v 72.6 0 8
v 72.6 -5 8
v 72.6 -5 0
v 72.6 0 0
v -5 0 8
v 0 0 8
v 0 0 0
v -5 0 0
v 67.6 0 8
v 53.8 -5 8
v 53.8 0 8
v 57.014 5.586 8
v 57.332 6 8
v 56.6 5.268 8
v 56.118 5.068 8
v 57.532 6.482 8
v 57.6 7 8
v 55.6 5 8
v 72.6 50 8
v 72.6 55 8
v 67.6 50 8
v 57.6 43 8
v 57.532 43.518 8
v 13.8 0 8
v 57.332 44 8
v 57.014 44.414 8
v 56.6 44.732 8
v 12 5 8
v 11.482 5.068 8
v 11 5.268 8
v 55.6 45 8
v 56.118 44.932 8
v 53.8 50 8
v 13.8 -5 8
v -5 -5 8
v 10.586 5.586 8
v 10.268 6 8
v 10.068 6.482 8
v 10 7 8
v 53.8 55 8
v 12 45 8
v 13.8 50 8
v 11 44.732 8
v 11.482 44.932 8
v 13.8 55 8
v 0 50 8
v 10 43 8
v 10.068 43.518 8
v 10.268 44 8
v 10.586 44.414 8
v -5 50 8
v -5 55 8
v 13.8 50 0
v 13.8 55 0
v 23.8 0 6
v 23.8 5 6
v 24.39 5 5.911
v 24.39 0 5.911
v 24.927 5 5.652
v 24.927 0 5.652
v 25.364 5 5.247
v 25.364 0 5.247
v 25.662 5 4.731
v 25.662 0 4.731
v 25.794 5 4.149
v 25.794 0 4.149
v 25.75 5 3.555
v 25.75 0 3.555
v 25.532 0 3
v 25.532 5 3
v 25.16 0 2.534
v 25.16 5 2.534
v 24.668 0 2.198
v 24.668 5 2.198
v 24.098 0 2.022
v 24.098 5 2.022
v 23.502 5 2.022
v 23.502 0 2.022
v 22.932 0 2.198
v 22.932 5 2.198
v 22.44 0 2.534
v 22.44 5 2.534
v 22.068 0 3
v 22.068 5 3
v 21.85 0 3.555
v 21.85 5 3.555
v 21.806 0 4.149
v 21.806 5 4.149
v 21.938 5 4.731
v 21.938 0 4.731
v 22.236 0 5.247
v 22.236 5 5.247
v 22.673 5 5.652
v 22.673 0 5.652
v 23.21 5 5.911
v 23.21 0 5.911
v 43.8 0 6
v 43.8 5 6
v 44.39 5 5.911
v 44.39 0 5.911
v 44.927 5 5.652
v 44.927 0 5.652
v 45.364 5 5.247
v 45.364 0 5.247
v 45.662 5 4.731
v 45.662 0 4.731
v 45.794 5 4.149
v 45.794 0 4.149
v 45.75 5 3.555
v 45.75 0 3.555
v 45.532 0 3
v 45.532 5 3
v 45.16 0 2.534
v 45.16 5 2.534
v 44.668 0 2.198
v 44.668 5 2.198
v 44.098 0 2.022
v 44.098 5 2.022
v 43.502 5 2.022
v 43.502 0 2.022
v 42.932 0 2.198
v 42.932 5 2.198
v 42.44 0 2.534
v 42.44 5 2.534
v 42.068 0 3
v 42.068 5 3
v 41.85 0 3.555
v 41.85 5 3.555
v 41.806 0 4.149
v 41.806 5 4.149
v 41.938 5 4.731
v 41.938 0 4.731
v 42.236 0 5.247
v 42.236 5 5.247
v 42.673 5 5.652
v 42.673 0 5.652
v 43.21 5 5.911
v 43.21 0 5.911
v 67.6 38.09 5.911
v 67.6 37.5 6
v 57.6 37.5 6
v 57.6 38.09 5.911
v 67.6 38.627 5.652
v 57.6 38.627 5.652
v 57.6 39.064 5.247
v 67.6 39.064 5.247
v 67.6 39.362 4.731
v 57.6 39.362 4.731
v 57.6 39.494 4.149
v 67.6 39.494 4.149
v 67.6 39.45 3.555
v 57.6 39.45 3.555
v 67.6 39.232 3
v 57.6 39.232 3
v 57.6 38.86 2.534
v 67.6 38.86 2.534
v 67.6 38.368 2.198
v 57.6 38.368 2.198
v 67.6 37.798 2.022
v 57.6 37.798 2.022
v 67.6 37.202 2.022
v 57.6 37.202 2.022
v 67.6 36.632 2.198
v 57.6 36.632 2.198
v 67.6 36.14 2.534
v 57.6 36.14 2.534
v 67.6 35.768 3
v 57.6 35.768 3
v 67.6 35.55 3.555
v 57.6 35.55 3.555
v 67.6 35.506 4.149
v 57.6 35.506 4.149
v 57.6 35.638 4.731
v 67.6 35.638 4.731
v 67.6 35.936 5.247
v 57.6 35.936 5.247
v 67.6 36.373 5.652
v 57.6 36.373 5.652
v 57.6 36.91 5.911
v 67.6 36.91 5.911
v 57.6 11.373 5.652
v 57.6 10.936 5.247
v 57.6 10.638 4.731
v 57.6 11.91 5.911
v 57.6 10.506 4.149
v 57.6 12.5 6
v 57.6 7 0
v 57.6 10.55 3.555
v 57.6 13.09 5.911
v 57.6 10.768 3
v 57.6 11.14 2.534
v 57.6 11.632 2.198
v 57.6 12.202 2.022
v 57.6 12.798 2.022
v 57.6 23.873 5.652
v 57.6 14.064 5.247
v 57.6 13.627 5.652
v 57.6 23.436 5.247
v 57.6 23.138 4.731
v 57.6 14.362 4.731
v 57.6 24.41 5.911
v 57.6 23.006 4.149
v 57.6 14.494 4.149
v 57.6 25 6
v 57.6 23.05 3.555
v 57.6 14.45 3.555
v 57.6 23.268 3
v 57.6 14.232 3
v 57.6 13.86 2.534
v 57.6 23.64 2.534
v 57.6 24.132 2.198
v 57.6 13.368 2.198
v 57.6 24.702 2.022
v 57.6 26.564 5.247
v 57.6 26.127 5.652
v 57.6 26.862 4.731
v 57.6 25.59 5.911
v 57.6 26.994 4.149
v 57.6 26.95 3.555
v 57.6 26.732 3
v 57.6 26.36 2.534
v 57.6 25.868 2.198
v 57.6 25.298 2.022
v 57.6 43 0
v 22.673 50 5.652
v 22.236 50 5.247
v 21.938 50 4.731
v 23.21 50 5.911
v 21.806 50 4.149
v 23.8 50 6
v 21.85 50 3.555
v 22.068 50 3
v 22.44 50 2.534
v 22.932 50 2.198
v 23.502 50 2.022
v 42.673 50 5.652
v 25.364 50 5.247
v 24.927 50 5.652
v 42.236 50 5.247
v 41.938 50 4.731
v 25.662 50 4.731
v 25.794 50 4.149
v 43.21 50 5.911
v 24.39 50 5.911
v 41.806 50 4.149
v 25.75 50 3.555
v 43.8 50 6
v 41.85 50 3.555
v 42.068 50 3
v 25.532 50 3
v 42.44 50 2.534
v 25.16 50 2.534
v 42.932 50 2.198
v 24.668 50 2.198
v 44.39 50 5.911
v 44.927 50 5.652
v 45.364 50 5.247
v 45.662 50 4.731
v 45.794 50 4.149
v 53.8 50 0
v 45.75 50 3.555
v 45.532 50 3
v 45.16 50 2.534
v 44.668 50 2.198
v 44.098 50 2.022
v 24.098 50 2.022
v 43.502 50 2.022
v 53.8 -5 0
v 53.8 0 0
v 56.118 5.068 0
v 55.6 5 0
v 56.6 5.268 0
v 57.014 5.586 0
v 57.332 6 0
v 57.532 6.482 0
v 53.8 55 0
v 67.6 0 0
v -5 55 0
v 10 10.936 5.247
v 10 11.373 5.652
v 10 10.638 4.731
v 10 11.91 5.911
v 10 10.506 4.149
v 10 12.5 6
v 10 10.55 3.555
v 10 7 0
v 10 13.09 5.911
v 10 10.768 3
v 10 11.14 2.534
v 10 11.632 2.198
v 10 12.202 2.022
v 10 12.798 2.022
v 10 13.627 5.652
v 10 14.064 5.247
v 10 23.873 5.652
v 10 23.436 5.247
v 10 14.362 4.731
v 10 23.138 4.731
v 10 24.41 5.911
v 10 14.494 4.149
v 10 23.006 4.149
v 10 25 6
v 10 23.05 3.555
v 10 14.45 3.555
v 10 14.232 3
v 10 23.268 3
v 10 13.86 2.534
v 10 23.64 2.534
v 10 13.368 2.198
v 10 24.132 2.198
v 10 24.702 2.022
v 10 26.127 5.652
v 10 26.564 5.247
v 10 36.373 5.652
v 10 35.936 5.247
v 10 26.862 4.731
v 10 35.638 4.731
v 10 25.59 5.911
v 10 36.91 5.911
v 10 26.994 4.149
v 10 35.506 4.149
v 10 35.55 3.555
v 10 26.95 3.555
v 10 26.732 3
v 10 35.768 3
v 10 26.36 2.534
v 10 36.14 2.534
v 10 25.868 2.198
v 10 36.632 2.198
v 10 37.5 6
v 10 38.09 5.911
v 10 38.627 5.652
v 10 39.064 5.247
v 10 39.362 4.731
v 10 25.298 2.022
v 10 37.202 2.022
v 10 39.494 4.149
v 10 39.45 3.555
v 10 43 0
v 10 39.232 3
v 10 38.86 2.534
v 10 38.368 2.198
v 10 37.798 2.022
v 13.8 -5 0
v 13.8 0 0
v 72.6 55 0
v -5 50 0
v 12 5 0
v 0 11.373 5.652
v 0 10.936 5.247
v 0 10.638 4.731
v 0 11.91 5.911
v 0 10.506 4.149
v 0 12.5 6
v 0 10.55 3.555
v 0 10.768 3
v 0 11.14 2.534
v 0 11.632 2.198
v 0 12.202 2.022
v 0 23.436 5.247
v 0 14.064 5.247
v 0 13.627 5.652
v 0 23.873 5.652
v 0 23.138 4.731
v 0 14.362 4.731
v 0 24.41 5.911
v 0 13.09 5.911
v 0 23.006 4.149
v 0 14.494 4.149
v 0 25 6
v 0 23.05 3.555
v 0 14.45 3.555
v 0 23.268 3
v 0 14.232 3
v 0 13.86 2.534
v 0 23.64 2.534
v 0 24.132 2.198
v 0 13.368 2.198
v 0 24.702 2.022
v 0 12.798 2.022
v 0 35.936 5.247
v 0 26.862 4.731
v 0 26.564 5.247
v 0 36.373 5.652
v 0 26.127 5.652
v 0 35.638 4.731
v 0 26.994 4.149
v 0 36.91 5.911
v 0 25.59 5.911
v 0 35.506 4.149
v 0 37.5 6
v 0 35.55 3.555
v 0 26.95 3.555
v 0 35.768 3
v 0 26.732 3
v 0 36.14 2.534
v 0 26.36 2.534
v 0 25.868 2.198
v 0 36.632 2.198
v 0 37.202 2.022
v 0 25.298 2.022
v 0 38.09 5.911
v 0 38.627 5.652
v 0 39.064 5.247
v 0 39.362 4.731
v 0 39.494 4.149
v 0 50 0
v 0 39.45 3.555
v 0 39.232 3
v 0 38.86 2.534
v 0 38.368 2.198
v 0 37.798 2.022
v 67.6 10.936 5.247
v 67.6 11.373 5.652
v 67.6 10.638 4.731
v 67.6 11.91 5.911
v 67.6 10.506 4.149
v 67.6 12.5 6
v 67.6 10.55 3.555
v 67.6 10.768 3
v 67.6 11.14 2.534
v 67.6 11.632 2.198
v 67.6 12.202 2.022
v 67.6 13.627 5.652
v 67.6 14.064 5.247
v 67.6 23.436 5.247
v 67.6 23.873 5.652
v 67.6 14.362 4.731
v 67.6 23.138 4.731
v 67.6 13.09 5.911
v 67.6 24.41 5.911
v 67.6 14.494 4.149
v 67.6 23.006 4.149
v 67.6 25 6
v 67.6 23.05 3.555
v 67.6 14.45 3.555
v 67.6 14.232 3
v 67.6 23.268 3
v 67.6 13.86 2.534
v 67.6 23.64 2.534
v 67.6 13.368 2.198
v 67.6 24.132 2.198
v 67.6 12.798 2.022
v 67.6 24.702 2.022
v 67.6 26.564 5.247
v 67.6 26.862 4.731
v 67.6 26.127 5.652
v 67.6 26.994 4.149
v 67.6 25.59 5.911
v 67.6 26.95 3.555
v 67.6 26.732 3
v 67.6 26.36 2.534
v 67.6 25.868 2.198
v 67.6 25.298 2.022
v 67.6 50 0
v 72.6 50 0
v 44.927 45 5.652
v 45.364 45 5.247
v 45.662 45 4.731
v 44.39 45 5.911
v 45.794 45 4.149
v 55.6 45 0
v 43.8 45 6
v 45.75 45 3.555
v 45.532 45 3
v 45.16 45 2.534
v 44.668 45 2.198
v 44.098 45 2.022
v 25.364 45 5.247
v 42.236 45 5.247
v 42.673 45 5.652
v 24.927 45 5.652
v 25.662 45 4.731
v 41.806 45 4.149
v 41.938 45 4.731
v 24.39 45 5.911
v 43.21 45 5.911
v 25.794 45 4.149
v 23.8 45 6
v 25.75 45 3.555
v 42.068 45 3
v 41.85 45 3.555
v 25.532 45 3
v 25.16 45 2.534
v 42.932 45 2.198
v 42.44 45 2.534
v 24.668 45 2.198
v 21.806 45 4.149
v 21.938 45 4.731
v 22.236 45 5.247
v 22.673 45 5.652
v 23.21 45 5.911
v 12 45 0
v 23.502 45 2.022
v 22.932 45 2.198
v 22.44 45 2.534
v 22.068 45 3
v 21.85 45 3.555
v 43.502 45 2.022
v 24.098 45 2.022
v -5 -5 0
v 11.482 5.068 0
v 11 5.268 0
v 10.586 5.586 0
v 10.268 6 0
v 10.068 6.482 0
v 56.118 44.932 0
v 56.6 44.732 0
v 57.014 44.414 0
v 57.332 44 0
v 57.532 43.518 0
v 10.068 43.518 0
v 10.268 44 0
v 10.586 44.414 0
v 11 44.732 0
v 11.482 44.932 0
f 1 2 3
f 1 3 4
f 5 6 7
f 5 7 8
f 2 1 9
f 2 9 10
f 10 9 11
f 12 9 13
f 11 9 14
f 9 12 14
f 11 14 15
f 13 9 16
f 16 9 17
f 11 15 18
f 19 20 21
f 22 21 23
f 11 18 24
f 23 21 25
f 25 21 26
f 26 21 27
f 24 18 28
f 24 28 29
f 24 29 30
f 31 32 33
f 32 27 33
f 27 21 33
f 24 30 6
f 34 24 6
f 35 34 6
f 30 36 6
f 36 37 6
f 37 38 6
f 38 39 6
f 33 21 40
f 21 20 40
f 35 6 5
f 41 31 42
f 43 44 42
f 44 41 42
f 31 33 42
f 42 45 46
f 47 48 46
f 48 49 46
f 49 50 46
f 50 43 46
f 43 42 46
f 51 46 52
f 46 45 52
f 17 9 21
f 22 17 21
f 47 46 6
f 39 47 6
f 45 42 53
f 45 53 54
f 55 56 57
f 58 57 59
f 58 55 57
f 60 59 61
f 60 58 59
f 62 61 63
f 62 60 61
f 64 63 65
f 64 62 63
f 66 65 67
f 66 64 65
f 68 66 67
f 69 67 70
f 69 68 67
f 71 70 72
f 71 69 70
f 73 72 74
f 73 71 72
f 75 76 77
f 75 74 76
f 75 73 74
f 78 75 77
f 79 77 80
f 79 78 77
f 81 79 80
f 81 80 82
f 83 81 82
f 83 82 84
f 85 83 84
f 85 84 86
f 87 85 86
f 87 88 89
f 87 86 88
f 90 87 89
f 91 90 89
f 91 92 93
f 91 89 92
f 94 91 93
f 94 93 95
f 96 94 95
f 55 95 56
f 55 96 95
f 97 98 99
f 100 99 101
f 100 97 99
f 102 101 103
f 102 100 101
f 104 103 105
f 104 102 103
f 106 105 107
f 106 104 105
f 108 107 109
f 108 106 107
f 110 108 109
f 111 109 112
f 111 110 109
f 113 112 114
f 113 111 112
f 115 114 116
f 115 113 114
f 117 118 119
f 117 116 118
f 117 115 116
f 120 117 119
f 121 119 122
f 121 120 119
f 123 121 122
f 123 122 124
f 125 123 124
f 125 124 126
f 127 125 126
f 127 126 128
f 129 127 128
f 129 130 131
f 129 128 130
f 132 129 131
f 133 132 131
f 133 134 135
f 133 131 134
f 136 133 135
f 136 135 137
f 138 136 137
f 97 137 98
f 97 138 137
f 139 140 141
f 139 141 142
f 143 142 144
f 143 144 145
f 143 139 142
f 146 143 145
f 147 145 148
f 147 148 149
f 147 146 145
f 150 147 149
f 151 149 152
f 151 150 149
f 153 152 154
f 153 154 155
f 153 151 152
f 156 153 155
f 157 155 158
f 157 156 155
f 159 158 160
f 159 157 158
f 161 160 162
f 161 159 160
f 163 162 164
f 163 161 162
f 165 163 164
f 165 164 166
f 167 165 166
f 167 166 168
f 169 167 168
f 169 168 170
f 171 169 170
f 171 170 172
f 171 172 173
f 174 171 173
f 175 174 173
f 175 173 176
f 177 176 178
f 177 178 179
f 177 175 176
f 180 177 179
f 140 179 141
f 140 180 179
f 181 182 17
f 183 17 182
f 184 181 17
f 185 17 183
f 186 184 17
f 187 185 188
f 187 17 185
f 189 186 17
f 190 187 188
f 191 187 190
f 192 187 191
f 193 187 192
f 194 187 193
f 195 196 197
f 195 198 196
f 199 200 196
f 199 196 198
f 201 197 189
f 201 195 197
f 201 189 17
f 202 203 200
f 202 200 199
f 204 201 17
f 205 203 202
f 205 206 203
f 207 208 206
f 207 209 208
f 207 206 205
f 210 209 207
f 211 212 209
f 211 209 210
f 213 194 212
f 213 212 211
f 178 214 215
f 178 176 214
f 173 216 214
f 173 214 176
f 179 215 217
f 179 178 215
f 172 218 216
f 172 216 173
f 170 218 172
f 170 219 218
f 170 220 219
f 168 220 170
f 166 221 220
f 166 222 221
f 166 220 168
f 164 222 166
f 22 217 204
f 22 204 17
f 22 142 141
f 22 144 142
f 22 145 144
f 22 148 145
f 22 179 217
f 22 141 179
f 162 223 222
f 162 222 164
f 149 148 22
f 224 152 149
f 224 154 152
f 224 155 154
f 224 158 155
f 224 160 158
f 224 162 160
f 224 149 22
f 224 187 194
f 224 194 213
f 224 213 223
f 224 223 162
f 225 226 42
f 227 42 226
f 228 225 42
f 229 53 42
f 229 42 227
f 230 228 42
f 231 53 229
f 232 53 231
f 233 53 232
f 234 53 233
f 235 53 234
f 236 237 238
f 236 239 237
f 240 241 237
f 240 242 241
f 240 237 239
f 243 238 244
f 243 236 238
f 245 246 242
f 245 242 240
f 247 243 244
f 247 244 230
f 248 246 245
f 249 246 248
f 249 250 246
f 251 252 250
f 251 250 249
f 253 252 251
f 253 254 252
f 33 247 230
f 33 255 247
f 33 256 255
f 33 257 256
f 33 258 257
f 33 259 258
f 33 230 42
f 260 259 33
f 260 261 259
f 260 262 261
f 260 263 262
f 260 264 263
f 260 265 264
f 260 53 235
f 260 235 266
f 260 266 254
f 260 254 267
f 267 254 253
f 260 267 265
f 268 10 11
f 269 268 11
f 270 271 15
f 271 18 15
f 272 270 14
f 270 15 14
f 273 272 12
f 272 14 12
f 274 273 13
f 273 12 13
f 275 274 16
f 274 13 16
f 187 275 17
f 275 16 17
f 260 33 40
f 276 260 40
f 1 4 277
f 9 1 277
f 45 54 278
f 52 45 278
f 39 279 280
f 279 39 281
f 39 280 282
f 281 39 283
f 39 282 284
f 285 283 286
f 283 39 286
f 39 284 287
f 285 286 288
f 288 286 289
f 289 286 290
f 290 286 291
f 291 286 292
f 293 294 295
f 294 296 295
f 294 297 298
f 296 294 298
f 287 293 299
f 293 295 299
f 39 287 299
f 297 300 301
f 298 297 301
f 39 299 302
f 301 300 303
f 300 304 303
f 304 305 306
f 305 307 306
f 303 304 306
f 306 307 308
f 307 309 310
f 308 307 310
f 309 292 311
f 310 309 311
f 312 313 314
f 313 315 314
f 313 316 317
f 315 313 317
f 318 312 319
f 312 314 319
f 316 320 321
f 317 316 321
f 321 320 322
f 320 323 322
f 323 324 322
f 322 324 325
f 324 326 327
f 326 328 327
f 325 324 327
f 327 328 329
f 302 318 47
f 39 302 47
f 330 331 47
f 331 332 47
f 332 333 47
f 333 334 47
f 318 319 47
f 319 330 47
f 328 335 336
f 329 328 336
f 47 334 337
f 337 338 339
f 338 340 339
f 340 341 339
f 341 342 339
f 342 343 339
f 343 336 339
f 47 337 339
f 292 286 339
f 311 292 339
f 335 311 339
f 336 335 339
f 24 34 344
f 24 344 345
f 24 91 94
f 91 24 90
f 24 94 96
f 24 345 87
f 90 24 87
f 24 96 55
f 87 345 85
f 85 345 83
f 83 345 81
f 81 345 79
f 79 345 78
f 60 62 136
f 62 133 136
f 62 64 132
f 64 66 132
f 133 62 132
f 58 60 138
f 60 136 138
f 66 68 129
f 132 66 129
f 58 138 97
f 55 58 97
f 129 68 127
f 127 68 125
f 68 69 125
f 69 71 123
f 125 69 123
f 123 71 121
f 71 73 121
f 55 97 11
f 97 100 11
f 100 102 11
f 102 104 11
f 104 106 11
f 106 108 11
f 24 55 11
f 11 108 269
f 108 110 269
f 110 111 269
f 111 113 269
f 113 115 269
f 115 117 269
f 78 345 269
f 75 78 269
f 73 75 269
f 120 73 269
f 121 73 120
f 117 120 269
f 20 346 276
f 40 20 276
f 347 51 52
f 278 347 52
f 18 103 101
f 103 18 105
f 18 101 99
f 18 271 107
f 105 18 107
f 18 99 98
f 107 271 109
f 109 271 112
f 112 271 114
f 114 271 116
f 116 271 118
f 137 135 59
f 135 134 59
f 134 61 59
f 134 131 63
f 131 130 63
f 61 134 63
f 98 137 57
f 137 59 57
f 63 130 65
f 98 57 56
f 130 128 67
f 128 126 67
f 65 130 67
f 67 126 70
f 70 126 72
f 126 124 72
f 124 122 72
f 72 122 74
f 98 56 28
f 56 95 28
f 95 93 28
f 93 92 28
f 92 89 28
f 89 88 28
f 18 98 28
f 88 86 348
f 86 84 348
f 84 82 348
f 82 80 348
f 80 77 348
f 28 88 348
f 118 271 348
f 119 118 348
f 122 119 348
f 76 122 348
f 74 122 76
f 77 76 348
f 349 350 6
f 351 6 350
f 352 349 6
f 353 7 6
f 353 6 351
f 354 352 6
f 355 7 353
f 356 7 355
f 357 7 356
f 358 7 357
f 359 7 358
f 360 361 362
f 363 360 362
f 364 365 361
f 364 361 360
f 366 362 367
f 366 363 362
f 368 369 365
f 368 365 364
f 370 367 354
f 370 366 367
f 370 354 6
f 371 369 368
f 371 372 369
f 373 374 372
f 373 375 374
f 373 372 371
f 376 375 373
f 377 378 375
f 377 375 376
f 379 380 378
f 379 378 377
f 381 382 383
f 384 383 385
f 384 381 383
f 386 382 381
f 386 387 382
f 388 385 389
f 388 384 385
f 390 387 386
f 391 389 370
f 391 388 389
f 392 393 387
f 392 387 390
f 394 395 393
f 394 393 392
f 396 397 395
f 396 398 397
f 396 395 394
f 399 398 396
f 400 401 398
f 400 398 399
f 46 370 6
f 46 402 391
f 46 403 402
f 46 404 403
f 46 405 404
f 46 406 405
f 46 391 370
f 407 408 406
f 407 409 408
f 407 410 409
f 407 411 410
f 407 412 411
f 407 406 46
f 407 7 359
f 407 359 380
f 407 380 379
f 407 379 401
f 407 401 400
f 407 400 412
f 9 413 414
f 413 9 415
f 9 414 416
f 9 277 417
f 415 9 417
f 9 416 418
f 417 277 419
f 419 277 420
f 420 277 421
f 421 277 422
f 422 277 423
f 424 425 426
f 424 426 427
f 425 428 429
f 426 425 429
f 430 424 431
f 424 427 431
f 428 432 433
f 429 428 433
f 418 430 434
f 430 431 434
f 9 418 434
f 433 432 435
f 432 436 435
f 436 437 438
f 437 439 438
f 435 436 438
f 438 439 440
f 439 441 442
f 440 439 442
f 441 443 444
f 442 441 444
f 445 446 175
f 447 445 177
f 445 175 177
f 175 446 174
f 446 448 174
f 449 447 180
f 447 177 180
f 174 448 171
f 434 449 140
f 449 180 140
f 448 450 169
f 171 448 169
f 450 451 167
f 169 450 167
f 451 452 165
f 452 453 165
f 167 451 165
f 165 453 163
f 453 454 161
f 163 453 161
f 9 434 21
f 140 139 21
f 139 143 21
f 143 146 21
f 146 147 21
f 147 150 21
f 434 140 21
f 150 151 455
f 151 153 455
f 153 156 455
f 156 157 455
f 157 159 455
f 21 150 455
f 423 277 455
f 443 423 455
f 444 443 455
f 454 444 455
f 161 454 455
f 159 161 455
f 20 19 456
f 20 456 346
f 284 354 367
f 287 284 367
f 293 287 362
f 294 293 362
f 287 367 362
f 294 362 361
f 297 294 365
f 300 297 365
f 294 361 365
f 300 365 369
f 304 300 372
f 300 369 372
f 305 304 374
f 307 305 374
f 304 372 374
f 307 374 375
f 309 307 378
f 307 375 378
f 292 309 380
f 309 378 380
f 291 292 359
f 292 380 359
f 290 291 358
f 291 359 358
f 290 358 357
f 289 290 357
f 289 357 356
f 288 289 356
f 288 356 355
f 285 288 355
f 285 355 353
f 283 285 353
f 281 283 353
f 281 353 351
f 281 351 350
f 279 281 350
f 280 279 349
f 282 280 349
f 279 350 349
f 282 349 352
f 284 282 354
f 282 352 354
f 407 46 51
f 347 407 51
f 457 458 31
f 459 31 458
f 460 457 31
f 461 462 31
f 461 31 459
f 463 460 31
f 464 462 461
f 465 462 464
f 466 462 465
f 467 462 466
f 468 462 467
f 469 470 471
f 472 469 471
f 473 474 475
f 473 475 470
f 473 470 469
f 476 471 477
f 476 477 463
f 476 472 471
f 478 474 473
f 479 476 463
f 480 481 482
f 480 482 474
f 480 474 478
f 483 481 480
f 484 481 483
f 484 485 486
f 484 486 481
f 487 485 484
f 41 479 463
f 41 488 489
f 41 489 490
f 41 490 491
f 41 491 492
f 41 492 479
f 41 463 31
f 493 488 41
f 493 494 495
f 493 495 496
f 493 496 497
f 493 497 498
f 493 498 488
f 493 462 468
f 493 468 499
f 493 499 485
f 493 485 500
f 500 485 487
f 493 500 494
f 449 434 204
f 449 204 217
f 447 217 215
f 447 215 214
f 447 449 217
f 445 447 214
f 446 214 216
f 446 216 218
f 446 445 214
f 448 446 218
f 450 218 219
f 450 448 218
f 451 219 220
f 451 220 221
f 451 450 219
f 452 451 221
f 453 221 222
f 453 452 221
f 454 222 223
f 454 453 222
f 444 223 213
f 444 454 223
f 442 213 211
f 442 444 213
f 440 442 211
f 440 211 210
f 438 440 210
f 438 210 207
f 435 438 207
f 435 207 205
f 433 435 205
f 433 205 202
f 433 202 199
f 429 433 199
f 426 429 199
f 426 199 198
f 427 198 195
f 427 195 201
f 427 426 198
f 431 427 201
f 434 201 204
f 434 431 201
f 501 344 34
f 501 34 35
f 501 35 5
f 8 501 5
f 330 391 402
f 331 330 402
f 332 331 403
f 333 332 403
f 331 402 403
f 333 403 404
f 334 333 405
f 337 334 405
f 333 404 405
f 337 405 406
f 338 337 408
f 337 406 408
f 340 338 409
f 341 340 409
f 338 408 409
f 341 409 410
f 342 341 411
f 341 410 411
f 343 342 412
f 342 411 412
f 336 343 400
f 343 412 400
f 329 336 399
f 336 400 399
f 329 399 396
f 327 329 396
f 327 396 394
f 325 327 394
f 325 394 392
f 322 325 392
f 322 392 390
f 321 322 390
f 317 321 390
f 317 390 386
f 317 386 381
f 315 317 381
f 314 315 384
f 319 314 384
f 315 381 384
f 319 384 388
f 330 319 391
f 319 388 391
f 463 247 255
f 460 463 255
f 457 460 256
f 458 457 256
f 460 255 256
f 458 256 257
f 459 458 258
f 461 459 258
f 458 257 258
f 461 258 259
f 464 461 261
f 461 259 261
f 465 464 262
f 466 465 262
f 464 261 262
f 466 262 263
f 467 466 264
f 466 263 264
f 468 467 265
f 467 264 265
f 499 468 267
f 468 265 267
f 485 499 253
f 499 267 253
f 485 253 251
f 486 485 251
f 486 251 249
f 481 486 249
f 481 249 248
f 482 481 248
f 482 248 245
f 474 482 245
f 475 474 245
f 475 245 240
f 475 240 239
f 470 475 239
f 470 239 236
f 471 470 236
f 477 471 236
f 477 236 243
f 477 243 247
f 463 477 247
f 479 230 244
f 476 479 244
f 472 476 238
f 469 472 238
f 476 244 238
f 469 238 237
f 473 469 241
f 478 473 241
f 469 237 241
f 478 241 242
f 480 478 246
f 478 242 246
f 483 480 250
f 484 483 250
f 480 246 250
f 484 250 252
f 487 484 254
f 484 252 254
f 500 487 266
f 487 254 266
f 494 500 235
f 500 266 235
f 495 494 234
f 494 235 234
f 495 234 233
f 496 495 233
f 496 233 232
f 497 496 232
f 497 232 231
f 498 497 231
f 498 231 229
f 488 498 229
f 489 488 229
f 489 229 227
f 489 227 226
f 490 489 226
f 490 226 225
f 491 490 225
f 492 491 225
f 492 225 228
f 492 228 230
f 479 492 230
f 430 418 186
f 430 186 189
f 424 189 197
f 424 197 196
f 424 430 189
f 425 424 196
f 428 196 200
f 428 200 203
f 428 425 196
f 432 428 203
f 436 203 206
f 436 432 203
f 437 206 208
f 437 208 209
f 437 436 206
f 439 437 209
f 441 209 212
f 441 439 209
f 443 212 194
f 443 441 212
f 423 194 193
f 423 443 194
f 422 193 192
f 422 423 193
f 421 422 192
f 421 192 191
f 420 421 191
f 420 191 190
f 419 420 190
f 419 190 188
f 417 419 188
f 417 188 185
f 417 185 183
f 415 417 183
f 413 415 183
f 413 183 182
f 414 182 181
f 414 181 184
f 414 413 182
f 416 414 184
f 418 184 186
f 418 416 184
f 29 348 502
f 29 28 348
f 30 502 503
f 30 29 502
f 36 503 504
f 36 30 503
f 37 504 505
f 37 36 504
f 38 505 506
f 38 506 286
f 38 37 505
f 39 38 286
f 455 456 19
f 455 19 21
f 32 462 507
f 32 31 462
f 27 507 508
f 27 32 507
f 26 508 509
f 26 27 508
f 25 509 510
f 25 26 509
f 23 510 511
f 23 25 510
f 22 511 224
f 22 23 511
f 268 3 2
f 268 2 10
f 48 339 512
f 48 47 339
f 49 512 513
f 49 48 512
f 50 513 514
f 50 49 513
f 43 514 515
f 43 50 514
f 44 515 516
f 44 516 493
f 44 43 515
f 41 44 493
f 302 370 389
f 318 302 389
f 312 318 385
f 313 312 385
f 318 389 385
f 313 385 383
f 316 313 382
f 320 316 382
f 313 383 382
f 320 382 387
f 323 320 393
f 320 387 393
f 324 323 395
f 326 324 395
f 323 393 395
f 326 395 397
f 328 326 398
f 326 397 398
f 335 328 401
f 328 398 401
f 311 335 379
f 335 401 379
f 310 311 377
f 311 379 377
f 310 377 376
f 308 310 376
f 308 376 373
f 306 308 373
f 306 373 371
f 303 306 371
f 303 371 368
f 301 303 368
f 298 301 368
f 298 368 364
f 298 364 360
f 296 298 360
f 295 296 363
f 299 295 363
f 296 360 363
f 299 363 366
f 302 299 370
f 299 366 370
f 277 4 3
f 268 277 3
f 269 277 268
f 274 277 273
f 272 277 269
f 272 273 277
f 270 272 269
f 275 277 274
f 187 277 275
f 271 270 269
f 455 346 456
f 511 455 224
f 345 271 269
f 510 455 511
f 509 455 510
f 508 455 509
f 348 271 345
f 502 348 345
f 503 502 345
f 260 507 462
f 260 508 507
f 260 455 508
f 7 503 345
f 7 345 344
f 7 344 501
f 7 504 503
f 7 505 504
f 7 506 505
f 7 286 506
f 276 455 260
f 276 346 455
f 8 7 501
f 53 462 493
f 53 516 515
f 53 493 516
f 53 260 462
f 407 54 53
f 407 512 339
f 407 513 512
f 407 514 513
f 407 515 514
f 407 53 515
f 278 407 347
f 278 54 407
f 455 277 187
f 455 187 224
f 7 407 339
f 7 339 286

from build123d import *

# Parameters (mm, degrees)
SKETCH_1_W          = 67.6
SKETCH_1_H          = 50
EXTRUDE_1_DEPTH     = 8
SKETCH_2_R          = 2
CUT_EXTRUDE_1_DEPTH = 10
SKETCH_3_R          = 2
CUT_EXTRUDE_2_DEPTH = 10
SKETCH_4_W          = 18.8
SKETCH_4_H          = 5
EXTRUDE_2_DEPTH     = 8
SKETCH_5_W          = 47.6
SKETCH_5_H          = 40
CUT_EXTRUDE_3_DEPTH = 8
FILLET_1_R          = 2


with BuildPart() as part:
    # 草图1 → 凸台-拉伸1 (new body)
    with BuildSketch(Plane.XY):
        with Locations((33.8, 25)):
            Rectangle(SKETCH_1_W, SKETCH_1_H)
    extrude(amount=EXTRUDE_1_DEPTH)

    # 草图2 → 切除-拉伸1 (cut)
    with BuildSketch(Plane.ZY):
        with Locations((4, 37.5)):
            Circle(SKETCH_2_R)
        with Locations((4, 25)):
            Circle(SKETCH_2_R)
        with Locations((4, 12.5)):
            Circle(SKETCH_2_R)
    cut_extrude_1 = extrude(amount=-CUT_EXTRUDE_1_DEPTH, mode=Mode.SUBTRACT)

    # 镜向1: 切除-拉伸1 across plane
    add(cut_extrude_1.mirror(Plane(origin=(33.8, 0, 0), x_dir=(0, 0, 1), z_dir=(1, 0, 0))), mode=Mode.SUBTRACT)

    # 草图3 → 切除-拉伸2 (cut)
    with BuildSketch(Plane(origin=(0, 50, 0), x_dir=(1, 0, 0), z_dir=(0, 1, 0))):
        with Locations(Location((23.8, -4, 0), (0, 0, 270))):
            Circle(SKETCH_3_R)
        with Locations(Location((43.8, -4, 0), (0, 0, 270))):
            Circle(SKETCH_3_R)
    cut_extrude_2 = extrude(amount=-CUT_EXTRUDE_2_DEPTH, mode=Mode.SUBTRACT)

    # 镜向2: 切除-拉伸2 across plane
    add(cut_extrude_2.mirror(Plane.ZX.offset(25)), mode=Mode.SUBTRACT)

    # 草图4 → 凸台-拉伸2 (add)
    with BuildSketch(Plane(origin=(0, 0, 0), x_dir=(-1, 0, 0), z_dir=(0, 0, -1))):
        with Locations((-63.2, 52.5)):
            Rectangle(SKETCH_4_W, SKETCH_4_H)
        with Locations((-63.2, -2.5)):
            Rectangle(SKETCH_4_W, SKETCH_4_H)
        with Locations((-4.4, -2.5)):
            Rectangle(SKETCH_4_W, SKETCH_4_H)
        with Locations((-4.4, 52.5)):
            Rectangle(SKETCH_4_W, SKETCH_4_H)
    extrude(amount=-EXTRUDE_2_DEPTH)

    # 草图5 → 切除-拉伸3 (cut)
    with BuildSketch(Plane(origin=(0, 0, 0), x_dir=(-1, 0, 0), z_dir=(0, 0, -1))):
        with Locations((-33.8, 25)):
            Rectangle(SKETCH_5_W, SKETCH_5_H)
    extrude(amount=-CUT_EXTRUDE_3_DEPTH, mode=Mode.SUBTRACT)

    # 圆角1
    fillet_1_edges = [part.edges().sort_by_distance(p)[0] for p in [
        (10, 45, 4),
        (57.6, 45, 4),
        (57.6, 5, 4),
        (10, 5, 4),
    ]]
    fillet(fillet_1_edges, radius=FILLET_1_R)


solid = part.part
